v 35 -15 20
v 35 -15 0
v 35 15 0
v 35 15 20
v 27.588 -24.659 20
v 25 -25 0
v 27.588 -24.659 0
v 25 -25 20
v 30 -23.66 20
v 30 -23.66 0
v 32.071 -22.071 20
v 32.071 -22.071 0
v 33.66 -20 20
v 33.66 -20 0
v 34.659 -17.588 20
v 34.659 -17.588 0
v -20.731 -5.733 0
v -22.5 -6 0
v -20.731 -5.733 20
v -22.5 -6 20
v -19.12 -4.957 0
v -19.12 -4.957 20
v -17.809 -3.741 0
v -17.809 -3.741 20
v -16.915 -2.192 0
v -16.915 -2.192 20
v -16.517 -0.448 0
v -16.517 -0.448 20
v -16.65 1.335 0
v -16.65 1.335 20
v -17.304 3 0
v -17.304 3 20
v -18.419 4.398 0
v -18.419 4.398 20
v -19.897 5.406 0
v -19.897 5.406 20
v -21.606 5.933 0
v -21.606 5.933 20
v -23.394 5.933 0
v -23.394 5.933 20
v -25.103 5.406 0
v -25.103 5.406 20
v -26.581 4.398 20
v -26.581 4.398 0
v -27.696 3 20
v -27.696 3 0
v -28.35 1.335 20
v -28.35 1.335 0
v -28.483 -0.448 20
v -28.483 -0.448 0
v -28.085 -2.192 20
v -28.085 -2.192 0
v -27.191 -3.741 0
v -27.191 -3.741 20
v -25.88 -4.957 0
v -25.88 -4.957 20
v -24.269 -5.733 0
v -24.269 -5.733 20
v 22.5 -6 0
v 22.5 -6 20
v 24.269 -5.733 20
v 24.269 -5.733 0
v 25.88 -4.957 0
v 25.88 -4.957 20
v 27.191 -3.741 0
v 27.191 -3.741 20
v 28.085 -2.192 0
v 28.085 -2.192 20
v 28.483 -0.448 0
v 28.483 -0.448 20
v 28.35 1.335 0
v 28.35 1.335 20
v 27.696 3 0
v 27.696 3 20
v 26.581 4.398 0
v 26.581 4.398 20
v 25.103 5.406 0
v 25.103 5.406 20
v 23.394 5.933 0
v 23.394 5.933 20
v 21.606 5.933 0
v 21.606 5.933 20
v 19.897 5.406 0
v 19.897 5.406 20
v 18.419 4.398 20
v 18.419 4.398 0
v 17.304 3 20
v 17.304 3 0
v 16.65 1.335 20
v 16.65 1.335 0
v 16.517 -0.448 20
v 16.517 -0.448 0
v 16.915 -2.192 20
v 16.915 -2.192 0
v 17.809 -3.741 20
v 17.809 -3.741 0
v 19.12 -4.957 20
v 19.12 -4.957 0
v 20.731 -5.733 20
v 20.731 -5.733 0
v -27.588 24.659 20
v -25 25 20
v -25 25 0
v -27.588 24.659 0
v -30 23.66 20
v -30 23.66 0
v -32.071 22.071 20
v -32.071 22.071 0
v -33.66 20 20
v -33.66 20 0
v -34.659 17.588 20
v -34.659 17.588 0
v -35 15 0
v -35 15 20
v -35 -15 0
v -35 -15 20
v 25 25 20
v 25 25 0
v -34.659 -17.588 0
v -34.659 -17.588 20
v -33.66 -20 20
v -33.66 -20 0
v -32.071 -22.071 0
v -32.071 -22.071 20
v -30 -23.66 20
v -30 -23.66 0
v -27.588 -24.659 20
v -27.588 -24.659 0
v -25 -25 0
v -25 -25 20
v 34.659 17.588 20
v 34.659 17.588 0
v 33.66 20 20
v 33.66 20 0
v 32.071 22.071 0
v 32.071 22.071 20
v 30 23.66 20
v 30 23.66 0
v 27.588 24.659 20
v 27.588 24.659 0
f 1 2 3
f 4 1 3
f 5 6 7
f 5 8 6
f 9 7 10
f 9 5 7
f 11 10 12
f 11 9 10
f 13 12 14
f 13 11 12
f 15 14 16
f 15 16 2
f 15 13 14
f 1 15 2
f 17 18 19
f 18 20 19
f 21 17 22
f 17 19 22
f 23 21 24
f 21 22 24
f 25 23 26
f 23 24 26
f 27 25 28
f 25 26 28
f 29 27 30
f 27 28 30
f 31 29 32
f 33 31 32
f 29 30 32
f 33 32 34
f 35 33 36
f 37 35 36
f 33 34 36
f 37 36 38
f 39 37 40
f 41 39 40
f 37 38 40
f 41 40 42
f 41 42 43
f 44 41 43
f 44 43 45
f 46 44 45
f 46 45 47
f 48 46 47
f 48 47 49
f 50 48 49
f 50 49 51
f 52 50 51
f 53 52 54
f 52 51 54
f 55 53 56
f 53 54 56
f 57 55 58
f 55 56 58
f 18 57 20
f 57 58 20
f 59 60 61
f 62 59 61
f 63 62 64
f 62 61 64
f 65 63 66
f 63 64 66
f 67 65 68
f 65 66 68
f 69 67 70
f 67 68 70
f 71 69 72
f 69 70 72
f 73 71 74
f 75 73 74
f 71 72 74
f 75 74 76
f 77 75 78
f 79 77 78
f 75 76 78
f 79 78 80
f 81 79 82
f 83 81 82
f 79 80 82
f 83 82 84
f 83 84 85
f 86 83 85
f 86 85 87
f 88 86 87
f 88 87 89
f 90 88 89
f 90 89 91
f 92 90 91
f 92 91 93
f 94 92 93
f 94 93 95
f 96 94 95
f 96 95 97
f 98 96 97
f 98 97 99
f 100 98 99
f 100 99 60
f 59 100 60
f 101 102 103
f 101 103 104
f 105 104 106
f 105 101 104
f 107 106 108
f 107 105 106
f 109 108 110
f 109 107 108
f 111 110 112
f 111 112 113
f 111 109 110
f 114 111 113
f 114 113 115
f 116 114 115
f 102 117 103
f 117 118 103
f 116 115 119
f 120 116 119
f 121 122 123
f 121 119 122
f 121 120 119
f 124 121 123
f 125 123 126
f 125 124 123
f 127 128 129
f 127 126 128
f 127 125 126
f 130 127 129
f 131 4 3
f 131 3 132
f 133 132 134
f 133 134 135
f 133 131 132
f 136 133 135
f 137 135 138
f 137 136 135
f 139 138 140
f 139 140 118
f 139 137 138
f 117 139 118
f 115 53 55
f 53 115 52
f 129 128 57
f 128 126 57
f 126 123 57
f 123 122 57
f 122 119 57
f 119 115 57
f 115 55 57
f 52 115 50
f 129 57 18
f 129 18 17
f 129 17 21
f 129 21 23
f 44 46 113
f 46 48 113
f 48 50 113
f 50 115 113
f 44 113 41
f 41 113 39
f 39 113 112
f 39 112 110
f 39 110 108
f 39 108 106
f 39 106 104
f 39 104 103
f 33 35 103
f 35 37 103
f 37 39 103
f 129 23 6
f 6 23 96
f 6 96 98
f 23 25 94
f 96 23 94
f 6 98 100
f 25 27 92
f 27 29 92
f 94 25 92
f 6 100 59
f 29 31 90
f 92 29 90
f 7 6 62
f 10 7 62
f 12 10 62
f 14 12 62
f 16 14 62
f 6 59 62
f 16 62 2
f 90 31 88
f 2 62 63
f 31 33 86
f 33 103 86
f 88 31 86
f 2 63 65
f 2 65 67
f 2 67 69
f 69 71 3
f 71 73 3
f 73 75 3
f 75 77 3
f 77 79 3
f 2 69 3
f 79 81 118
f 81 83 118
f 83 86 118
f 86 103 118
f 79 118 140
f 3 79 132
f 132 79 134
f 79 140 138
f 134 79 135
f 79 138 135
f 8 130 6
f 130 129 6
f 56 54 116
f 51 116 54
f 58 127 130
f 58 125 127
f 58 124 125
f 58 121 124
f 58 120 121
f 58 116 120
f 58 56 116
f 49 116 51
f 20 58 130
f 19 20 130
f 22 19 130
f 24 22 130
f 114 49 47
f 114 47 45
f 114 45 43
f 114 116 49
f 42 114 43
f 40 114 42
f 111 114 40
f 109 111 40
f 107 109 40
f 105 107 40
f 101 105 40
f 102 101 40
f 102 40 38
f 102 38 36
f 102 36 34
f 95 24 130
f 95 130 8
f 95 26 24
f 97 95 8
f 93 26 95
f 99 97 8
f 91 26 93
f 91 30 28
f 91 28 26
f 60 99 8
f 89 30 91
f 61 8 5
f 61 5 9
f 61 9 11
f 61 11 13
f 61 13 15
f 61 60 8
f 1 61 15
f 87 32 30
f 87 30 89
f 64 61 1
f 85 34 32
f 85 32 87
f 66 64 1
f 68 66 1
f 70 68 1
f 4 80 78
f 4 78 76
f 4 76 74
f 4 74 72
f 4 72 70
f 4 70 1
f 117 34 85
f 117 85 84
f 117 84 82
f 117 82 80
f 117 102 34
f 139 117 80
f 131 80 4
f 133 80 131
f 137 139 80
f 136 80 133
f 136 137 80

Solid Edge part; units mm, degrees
sketch "Sketch1" plane through (0, 0, 0) normal (0, 0, 1) x (1, 0, 0)
  line L0 (-35, -25) -> (35, -25)
  line L1 (35, -25) -> (35, 25)
  line L2 (35, 25) -> (-35, 25)
  line L3 (-35, 25) -> (-35, -25)
  dimension "D1" = 70
  dimension "D2" = 50
extrude "Protrusion1" add sketch "Sketch1" along normal blind 20
fillet "Round1" radius 10 4 edges at (-35, -25, 10) (-35, 25, 10) (35, -25, 10) (35, 25, 10)
hole "Hole1" at (-22.5, 0, 20) direction (0, 0, -1) diameter 12 end up to next
hole "Hole2" at (22.5, 0, 20) direction (0, 0, -1) diameter 12 end up to next
properties material "알루미늄, 1060"
